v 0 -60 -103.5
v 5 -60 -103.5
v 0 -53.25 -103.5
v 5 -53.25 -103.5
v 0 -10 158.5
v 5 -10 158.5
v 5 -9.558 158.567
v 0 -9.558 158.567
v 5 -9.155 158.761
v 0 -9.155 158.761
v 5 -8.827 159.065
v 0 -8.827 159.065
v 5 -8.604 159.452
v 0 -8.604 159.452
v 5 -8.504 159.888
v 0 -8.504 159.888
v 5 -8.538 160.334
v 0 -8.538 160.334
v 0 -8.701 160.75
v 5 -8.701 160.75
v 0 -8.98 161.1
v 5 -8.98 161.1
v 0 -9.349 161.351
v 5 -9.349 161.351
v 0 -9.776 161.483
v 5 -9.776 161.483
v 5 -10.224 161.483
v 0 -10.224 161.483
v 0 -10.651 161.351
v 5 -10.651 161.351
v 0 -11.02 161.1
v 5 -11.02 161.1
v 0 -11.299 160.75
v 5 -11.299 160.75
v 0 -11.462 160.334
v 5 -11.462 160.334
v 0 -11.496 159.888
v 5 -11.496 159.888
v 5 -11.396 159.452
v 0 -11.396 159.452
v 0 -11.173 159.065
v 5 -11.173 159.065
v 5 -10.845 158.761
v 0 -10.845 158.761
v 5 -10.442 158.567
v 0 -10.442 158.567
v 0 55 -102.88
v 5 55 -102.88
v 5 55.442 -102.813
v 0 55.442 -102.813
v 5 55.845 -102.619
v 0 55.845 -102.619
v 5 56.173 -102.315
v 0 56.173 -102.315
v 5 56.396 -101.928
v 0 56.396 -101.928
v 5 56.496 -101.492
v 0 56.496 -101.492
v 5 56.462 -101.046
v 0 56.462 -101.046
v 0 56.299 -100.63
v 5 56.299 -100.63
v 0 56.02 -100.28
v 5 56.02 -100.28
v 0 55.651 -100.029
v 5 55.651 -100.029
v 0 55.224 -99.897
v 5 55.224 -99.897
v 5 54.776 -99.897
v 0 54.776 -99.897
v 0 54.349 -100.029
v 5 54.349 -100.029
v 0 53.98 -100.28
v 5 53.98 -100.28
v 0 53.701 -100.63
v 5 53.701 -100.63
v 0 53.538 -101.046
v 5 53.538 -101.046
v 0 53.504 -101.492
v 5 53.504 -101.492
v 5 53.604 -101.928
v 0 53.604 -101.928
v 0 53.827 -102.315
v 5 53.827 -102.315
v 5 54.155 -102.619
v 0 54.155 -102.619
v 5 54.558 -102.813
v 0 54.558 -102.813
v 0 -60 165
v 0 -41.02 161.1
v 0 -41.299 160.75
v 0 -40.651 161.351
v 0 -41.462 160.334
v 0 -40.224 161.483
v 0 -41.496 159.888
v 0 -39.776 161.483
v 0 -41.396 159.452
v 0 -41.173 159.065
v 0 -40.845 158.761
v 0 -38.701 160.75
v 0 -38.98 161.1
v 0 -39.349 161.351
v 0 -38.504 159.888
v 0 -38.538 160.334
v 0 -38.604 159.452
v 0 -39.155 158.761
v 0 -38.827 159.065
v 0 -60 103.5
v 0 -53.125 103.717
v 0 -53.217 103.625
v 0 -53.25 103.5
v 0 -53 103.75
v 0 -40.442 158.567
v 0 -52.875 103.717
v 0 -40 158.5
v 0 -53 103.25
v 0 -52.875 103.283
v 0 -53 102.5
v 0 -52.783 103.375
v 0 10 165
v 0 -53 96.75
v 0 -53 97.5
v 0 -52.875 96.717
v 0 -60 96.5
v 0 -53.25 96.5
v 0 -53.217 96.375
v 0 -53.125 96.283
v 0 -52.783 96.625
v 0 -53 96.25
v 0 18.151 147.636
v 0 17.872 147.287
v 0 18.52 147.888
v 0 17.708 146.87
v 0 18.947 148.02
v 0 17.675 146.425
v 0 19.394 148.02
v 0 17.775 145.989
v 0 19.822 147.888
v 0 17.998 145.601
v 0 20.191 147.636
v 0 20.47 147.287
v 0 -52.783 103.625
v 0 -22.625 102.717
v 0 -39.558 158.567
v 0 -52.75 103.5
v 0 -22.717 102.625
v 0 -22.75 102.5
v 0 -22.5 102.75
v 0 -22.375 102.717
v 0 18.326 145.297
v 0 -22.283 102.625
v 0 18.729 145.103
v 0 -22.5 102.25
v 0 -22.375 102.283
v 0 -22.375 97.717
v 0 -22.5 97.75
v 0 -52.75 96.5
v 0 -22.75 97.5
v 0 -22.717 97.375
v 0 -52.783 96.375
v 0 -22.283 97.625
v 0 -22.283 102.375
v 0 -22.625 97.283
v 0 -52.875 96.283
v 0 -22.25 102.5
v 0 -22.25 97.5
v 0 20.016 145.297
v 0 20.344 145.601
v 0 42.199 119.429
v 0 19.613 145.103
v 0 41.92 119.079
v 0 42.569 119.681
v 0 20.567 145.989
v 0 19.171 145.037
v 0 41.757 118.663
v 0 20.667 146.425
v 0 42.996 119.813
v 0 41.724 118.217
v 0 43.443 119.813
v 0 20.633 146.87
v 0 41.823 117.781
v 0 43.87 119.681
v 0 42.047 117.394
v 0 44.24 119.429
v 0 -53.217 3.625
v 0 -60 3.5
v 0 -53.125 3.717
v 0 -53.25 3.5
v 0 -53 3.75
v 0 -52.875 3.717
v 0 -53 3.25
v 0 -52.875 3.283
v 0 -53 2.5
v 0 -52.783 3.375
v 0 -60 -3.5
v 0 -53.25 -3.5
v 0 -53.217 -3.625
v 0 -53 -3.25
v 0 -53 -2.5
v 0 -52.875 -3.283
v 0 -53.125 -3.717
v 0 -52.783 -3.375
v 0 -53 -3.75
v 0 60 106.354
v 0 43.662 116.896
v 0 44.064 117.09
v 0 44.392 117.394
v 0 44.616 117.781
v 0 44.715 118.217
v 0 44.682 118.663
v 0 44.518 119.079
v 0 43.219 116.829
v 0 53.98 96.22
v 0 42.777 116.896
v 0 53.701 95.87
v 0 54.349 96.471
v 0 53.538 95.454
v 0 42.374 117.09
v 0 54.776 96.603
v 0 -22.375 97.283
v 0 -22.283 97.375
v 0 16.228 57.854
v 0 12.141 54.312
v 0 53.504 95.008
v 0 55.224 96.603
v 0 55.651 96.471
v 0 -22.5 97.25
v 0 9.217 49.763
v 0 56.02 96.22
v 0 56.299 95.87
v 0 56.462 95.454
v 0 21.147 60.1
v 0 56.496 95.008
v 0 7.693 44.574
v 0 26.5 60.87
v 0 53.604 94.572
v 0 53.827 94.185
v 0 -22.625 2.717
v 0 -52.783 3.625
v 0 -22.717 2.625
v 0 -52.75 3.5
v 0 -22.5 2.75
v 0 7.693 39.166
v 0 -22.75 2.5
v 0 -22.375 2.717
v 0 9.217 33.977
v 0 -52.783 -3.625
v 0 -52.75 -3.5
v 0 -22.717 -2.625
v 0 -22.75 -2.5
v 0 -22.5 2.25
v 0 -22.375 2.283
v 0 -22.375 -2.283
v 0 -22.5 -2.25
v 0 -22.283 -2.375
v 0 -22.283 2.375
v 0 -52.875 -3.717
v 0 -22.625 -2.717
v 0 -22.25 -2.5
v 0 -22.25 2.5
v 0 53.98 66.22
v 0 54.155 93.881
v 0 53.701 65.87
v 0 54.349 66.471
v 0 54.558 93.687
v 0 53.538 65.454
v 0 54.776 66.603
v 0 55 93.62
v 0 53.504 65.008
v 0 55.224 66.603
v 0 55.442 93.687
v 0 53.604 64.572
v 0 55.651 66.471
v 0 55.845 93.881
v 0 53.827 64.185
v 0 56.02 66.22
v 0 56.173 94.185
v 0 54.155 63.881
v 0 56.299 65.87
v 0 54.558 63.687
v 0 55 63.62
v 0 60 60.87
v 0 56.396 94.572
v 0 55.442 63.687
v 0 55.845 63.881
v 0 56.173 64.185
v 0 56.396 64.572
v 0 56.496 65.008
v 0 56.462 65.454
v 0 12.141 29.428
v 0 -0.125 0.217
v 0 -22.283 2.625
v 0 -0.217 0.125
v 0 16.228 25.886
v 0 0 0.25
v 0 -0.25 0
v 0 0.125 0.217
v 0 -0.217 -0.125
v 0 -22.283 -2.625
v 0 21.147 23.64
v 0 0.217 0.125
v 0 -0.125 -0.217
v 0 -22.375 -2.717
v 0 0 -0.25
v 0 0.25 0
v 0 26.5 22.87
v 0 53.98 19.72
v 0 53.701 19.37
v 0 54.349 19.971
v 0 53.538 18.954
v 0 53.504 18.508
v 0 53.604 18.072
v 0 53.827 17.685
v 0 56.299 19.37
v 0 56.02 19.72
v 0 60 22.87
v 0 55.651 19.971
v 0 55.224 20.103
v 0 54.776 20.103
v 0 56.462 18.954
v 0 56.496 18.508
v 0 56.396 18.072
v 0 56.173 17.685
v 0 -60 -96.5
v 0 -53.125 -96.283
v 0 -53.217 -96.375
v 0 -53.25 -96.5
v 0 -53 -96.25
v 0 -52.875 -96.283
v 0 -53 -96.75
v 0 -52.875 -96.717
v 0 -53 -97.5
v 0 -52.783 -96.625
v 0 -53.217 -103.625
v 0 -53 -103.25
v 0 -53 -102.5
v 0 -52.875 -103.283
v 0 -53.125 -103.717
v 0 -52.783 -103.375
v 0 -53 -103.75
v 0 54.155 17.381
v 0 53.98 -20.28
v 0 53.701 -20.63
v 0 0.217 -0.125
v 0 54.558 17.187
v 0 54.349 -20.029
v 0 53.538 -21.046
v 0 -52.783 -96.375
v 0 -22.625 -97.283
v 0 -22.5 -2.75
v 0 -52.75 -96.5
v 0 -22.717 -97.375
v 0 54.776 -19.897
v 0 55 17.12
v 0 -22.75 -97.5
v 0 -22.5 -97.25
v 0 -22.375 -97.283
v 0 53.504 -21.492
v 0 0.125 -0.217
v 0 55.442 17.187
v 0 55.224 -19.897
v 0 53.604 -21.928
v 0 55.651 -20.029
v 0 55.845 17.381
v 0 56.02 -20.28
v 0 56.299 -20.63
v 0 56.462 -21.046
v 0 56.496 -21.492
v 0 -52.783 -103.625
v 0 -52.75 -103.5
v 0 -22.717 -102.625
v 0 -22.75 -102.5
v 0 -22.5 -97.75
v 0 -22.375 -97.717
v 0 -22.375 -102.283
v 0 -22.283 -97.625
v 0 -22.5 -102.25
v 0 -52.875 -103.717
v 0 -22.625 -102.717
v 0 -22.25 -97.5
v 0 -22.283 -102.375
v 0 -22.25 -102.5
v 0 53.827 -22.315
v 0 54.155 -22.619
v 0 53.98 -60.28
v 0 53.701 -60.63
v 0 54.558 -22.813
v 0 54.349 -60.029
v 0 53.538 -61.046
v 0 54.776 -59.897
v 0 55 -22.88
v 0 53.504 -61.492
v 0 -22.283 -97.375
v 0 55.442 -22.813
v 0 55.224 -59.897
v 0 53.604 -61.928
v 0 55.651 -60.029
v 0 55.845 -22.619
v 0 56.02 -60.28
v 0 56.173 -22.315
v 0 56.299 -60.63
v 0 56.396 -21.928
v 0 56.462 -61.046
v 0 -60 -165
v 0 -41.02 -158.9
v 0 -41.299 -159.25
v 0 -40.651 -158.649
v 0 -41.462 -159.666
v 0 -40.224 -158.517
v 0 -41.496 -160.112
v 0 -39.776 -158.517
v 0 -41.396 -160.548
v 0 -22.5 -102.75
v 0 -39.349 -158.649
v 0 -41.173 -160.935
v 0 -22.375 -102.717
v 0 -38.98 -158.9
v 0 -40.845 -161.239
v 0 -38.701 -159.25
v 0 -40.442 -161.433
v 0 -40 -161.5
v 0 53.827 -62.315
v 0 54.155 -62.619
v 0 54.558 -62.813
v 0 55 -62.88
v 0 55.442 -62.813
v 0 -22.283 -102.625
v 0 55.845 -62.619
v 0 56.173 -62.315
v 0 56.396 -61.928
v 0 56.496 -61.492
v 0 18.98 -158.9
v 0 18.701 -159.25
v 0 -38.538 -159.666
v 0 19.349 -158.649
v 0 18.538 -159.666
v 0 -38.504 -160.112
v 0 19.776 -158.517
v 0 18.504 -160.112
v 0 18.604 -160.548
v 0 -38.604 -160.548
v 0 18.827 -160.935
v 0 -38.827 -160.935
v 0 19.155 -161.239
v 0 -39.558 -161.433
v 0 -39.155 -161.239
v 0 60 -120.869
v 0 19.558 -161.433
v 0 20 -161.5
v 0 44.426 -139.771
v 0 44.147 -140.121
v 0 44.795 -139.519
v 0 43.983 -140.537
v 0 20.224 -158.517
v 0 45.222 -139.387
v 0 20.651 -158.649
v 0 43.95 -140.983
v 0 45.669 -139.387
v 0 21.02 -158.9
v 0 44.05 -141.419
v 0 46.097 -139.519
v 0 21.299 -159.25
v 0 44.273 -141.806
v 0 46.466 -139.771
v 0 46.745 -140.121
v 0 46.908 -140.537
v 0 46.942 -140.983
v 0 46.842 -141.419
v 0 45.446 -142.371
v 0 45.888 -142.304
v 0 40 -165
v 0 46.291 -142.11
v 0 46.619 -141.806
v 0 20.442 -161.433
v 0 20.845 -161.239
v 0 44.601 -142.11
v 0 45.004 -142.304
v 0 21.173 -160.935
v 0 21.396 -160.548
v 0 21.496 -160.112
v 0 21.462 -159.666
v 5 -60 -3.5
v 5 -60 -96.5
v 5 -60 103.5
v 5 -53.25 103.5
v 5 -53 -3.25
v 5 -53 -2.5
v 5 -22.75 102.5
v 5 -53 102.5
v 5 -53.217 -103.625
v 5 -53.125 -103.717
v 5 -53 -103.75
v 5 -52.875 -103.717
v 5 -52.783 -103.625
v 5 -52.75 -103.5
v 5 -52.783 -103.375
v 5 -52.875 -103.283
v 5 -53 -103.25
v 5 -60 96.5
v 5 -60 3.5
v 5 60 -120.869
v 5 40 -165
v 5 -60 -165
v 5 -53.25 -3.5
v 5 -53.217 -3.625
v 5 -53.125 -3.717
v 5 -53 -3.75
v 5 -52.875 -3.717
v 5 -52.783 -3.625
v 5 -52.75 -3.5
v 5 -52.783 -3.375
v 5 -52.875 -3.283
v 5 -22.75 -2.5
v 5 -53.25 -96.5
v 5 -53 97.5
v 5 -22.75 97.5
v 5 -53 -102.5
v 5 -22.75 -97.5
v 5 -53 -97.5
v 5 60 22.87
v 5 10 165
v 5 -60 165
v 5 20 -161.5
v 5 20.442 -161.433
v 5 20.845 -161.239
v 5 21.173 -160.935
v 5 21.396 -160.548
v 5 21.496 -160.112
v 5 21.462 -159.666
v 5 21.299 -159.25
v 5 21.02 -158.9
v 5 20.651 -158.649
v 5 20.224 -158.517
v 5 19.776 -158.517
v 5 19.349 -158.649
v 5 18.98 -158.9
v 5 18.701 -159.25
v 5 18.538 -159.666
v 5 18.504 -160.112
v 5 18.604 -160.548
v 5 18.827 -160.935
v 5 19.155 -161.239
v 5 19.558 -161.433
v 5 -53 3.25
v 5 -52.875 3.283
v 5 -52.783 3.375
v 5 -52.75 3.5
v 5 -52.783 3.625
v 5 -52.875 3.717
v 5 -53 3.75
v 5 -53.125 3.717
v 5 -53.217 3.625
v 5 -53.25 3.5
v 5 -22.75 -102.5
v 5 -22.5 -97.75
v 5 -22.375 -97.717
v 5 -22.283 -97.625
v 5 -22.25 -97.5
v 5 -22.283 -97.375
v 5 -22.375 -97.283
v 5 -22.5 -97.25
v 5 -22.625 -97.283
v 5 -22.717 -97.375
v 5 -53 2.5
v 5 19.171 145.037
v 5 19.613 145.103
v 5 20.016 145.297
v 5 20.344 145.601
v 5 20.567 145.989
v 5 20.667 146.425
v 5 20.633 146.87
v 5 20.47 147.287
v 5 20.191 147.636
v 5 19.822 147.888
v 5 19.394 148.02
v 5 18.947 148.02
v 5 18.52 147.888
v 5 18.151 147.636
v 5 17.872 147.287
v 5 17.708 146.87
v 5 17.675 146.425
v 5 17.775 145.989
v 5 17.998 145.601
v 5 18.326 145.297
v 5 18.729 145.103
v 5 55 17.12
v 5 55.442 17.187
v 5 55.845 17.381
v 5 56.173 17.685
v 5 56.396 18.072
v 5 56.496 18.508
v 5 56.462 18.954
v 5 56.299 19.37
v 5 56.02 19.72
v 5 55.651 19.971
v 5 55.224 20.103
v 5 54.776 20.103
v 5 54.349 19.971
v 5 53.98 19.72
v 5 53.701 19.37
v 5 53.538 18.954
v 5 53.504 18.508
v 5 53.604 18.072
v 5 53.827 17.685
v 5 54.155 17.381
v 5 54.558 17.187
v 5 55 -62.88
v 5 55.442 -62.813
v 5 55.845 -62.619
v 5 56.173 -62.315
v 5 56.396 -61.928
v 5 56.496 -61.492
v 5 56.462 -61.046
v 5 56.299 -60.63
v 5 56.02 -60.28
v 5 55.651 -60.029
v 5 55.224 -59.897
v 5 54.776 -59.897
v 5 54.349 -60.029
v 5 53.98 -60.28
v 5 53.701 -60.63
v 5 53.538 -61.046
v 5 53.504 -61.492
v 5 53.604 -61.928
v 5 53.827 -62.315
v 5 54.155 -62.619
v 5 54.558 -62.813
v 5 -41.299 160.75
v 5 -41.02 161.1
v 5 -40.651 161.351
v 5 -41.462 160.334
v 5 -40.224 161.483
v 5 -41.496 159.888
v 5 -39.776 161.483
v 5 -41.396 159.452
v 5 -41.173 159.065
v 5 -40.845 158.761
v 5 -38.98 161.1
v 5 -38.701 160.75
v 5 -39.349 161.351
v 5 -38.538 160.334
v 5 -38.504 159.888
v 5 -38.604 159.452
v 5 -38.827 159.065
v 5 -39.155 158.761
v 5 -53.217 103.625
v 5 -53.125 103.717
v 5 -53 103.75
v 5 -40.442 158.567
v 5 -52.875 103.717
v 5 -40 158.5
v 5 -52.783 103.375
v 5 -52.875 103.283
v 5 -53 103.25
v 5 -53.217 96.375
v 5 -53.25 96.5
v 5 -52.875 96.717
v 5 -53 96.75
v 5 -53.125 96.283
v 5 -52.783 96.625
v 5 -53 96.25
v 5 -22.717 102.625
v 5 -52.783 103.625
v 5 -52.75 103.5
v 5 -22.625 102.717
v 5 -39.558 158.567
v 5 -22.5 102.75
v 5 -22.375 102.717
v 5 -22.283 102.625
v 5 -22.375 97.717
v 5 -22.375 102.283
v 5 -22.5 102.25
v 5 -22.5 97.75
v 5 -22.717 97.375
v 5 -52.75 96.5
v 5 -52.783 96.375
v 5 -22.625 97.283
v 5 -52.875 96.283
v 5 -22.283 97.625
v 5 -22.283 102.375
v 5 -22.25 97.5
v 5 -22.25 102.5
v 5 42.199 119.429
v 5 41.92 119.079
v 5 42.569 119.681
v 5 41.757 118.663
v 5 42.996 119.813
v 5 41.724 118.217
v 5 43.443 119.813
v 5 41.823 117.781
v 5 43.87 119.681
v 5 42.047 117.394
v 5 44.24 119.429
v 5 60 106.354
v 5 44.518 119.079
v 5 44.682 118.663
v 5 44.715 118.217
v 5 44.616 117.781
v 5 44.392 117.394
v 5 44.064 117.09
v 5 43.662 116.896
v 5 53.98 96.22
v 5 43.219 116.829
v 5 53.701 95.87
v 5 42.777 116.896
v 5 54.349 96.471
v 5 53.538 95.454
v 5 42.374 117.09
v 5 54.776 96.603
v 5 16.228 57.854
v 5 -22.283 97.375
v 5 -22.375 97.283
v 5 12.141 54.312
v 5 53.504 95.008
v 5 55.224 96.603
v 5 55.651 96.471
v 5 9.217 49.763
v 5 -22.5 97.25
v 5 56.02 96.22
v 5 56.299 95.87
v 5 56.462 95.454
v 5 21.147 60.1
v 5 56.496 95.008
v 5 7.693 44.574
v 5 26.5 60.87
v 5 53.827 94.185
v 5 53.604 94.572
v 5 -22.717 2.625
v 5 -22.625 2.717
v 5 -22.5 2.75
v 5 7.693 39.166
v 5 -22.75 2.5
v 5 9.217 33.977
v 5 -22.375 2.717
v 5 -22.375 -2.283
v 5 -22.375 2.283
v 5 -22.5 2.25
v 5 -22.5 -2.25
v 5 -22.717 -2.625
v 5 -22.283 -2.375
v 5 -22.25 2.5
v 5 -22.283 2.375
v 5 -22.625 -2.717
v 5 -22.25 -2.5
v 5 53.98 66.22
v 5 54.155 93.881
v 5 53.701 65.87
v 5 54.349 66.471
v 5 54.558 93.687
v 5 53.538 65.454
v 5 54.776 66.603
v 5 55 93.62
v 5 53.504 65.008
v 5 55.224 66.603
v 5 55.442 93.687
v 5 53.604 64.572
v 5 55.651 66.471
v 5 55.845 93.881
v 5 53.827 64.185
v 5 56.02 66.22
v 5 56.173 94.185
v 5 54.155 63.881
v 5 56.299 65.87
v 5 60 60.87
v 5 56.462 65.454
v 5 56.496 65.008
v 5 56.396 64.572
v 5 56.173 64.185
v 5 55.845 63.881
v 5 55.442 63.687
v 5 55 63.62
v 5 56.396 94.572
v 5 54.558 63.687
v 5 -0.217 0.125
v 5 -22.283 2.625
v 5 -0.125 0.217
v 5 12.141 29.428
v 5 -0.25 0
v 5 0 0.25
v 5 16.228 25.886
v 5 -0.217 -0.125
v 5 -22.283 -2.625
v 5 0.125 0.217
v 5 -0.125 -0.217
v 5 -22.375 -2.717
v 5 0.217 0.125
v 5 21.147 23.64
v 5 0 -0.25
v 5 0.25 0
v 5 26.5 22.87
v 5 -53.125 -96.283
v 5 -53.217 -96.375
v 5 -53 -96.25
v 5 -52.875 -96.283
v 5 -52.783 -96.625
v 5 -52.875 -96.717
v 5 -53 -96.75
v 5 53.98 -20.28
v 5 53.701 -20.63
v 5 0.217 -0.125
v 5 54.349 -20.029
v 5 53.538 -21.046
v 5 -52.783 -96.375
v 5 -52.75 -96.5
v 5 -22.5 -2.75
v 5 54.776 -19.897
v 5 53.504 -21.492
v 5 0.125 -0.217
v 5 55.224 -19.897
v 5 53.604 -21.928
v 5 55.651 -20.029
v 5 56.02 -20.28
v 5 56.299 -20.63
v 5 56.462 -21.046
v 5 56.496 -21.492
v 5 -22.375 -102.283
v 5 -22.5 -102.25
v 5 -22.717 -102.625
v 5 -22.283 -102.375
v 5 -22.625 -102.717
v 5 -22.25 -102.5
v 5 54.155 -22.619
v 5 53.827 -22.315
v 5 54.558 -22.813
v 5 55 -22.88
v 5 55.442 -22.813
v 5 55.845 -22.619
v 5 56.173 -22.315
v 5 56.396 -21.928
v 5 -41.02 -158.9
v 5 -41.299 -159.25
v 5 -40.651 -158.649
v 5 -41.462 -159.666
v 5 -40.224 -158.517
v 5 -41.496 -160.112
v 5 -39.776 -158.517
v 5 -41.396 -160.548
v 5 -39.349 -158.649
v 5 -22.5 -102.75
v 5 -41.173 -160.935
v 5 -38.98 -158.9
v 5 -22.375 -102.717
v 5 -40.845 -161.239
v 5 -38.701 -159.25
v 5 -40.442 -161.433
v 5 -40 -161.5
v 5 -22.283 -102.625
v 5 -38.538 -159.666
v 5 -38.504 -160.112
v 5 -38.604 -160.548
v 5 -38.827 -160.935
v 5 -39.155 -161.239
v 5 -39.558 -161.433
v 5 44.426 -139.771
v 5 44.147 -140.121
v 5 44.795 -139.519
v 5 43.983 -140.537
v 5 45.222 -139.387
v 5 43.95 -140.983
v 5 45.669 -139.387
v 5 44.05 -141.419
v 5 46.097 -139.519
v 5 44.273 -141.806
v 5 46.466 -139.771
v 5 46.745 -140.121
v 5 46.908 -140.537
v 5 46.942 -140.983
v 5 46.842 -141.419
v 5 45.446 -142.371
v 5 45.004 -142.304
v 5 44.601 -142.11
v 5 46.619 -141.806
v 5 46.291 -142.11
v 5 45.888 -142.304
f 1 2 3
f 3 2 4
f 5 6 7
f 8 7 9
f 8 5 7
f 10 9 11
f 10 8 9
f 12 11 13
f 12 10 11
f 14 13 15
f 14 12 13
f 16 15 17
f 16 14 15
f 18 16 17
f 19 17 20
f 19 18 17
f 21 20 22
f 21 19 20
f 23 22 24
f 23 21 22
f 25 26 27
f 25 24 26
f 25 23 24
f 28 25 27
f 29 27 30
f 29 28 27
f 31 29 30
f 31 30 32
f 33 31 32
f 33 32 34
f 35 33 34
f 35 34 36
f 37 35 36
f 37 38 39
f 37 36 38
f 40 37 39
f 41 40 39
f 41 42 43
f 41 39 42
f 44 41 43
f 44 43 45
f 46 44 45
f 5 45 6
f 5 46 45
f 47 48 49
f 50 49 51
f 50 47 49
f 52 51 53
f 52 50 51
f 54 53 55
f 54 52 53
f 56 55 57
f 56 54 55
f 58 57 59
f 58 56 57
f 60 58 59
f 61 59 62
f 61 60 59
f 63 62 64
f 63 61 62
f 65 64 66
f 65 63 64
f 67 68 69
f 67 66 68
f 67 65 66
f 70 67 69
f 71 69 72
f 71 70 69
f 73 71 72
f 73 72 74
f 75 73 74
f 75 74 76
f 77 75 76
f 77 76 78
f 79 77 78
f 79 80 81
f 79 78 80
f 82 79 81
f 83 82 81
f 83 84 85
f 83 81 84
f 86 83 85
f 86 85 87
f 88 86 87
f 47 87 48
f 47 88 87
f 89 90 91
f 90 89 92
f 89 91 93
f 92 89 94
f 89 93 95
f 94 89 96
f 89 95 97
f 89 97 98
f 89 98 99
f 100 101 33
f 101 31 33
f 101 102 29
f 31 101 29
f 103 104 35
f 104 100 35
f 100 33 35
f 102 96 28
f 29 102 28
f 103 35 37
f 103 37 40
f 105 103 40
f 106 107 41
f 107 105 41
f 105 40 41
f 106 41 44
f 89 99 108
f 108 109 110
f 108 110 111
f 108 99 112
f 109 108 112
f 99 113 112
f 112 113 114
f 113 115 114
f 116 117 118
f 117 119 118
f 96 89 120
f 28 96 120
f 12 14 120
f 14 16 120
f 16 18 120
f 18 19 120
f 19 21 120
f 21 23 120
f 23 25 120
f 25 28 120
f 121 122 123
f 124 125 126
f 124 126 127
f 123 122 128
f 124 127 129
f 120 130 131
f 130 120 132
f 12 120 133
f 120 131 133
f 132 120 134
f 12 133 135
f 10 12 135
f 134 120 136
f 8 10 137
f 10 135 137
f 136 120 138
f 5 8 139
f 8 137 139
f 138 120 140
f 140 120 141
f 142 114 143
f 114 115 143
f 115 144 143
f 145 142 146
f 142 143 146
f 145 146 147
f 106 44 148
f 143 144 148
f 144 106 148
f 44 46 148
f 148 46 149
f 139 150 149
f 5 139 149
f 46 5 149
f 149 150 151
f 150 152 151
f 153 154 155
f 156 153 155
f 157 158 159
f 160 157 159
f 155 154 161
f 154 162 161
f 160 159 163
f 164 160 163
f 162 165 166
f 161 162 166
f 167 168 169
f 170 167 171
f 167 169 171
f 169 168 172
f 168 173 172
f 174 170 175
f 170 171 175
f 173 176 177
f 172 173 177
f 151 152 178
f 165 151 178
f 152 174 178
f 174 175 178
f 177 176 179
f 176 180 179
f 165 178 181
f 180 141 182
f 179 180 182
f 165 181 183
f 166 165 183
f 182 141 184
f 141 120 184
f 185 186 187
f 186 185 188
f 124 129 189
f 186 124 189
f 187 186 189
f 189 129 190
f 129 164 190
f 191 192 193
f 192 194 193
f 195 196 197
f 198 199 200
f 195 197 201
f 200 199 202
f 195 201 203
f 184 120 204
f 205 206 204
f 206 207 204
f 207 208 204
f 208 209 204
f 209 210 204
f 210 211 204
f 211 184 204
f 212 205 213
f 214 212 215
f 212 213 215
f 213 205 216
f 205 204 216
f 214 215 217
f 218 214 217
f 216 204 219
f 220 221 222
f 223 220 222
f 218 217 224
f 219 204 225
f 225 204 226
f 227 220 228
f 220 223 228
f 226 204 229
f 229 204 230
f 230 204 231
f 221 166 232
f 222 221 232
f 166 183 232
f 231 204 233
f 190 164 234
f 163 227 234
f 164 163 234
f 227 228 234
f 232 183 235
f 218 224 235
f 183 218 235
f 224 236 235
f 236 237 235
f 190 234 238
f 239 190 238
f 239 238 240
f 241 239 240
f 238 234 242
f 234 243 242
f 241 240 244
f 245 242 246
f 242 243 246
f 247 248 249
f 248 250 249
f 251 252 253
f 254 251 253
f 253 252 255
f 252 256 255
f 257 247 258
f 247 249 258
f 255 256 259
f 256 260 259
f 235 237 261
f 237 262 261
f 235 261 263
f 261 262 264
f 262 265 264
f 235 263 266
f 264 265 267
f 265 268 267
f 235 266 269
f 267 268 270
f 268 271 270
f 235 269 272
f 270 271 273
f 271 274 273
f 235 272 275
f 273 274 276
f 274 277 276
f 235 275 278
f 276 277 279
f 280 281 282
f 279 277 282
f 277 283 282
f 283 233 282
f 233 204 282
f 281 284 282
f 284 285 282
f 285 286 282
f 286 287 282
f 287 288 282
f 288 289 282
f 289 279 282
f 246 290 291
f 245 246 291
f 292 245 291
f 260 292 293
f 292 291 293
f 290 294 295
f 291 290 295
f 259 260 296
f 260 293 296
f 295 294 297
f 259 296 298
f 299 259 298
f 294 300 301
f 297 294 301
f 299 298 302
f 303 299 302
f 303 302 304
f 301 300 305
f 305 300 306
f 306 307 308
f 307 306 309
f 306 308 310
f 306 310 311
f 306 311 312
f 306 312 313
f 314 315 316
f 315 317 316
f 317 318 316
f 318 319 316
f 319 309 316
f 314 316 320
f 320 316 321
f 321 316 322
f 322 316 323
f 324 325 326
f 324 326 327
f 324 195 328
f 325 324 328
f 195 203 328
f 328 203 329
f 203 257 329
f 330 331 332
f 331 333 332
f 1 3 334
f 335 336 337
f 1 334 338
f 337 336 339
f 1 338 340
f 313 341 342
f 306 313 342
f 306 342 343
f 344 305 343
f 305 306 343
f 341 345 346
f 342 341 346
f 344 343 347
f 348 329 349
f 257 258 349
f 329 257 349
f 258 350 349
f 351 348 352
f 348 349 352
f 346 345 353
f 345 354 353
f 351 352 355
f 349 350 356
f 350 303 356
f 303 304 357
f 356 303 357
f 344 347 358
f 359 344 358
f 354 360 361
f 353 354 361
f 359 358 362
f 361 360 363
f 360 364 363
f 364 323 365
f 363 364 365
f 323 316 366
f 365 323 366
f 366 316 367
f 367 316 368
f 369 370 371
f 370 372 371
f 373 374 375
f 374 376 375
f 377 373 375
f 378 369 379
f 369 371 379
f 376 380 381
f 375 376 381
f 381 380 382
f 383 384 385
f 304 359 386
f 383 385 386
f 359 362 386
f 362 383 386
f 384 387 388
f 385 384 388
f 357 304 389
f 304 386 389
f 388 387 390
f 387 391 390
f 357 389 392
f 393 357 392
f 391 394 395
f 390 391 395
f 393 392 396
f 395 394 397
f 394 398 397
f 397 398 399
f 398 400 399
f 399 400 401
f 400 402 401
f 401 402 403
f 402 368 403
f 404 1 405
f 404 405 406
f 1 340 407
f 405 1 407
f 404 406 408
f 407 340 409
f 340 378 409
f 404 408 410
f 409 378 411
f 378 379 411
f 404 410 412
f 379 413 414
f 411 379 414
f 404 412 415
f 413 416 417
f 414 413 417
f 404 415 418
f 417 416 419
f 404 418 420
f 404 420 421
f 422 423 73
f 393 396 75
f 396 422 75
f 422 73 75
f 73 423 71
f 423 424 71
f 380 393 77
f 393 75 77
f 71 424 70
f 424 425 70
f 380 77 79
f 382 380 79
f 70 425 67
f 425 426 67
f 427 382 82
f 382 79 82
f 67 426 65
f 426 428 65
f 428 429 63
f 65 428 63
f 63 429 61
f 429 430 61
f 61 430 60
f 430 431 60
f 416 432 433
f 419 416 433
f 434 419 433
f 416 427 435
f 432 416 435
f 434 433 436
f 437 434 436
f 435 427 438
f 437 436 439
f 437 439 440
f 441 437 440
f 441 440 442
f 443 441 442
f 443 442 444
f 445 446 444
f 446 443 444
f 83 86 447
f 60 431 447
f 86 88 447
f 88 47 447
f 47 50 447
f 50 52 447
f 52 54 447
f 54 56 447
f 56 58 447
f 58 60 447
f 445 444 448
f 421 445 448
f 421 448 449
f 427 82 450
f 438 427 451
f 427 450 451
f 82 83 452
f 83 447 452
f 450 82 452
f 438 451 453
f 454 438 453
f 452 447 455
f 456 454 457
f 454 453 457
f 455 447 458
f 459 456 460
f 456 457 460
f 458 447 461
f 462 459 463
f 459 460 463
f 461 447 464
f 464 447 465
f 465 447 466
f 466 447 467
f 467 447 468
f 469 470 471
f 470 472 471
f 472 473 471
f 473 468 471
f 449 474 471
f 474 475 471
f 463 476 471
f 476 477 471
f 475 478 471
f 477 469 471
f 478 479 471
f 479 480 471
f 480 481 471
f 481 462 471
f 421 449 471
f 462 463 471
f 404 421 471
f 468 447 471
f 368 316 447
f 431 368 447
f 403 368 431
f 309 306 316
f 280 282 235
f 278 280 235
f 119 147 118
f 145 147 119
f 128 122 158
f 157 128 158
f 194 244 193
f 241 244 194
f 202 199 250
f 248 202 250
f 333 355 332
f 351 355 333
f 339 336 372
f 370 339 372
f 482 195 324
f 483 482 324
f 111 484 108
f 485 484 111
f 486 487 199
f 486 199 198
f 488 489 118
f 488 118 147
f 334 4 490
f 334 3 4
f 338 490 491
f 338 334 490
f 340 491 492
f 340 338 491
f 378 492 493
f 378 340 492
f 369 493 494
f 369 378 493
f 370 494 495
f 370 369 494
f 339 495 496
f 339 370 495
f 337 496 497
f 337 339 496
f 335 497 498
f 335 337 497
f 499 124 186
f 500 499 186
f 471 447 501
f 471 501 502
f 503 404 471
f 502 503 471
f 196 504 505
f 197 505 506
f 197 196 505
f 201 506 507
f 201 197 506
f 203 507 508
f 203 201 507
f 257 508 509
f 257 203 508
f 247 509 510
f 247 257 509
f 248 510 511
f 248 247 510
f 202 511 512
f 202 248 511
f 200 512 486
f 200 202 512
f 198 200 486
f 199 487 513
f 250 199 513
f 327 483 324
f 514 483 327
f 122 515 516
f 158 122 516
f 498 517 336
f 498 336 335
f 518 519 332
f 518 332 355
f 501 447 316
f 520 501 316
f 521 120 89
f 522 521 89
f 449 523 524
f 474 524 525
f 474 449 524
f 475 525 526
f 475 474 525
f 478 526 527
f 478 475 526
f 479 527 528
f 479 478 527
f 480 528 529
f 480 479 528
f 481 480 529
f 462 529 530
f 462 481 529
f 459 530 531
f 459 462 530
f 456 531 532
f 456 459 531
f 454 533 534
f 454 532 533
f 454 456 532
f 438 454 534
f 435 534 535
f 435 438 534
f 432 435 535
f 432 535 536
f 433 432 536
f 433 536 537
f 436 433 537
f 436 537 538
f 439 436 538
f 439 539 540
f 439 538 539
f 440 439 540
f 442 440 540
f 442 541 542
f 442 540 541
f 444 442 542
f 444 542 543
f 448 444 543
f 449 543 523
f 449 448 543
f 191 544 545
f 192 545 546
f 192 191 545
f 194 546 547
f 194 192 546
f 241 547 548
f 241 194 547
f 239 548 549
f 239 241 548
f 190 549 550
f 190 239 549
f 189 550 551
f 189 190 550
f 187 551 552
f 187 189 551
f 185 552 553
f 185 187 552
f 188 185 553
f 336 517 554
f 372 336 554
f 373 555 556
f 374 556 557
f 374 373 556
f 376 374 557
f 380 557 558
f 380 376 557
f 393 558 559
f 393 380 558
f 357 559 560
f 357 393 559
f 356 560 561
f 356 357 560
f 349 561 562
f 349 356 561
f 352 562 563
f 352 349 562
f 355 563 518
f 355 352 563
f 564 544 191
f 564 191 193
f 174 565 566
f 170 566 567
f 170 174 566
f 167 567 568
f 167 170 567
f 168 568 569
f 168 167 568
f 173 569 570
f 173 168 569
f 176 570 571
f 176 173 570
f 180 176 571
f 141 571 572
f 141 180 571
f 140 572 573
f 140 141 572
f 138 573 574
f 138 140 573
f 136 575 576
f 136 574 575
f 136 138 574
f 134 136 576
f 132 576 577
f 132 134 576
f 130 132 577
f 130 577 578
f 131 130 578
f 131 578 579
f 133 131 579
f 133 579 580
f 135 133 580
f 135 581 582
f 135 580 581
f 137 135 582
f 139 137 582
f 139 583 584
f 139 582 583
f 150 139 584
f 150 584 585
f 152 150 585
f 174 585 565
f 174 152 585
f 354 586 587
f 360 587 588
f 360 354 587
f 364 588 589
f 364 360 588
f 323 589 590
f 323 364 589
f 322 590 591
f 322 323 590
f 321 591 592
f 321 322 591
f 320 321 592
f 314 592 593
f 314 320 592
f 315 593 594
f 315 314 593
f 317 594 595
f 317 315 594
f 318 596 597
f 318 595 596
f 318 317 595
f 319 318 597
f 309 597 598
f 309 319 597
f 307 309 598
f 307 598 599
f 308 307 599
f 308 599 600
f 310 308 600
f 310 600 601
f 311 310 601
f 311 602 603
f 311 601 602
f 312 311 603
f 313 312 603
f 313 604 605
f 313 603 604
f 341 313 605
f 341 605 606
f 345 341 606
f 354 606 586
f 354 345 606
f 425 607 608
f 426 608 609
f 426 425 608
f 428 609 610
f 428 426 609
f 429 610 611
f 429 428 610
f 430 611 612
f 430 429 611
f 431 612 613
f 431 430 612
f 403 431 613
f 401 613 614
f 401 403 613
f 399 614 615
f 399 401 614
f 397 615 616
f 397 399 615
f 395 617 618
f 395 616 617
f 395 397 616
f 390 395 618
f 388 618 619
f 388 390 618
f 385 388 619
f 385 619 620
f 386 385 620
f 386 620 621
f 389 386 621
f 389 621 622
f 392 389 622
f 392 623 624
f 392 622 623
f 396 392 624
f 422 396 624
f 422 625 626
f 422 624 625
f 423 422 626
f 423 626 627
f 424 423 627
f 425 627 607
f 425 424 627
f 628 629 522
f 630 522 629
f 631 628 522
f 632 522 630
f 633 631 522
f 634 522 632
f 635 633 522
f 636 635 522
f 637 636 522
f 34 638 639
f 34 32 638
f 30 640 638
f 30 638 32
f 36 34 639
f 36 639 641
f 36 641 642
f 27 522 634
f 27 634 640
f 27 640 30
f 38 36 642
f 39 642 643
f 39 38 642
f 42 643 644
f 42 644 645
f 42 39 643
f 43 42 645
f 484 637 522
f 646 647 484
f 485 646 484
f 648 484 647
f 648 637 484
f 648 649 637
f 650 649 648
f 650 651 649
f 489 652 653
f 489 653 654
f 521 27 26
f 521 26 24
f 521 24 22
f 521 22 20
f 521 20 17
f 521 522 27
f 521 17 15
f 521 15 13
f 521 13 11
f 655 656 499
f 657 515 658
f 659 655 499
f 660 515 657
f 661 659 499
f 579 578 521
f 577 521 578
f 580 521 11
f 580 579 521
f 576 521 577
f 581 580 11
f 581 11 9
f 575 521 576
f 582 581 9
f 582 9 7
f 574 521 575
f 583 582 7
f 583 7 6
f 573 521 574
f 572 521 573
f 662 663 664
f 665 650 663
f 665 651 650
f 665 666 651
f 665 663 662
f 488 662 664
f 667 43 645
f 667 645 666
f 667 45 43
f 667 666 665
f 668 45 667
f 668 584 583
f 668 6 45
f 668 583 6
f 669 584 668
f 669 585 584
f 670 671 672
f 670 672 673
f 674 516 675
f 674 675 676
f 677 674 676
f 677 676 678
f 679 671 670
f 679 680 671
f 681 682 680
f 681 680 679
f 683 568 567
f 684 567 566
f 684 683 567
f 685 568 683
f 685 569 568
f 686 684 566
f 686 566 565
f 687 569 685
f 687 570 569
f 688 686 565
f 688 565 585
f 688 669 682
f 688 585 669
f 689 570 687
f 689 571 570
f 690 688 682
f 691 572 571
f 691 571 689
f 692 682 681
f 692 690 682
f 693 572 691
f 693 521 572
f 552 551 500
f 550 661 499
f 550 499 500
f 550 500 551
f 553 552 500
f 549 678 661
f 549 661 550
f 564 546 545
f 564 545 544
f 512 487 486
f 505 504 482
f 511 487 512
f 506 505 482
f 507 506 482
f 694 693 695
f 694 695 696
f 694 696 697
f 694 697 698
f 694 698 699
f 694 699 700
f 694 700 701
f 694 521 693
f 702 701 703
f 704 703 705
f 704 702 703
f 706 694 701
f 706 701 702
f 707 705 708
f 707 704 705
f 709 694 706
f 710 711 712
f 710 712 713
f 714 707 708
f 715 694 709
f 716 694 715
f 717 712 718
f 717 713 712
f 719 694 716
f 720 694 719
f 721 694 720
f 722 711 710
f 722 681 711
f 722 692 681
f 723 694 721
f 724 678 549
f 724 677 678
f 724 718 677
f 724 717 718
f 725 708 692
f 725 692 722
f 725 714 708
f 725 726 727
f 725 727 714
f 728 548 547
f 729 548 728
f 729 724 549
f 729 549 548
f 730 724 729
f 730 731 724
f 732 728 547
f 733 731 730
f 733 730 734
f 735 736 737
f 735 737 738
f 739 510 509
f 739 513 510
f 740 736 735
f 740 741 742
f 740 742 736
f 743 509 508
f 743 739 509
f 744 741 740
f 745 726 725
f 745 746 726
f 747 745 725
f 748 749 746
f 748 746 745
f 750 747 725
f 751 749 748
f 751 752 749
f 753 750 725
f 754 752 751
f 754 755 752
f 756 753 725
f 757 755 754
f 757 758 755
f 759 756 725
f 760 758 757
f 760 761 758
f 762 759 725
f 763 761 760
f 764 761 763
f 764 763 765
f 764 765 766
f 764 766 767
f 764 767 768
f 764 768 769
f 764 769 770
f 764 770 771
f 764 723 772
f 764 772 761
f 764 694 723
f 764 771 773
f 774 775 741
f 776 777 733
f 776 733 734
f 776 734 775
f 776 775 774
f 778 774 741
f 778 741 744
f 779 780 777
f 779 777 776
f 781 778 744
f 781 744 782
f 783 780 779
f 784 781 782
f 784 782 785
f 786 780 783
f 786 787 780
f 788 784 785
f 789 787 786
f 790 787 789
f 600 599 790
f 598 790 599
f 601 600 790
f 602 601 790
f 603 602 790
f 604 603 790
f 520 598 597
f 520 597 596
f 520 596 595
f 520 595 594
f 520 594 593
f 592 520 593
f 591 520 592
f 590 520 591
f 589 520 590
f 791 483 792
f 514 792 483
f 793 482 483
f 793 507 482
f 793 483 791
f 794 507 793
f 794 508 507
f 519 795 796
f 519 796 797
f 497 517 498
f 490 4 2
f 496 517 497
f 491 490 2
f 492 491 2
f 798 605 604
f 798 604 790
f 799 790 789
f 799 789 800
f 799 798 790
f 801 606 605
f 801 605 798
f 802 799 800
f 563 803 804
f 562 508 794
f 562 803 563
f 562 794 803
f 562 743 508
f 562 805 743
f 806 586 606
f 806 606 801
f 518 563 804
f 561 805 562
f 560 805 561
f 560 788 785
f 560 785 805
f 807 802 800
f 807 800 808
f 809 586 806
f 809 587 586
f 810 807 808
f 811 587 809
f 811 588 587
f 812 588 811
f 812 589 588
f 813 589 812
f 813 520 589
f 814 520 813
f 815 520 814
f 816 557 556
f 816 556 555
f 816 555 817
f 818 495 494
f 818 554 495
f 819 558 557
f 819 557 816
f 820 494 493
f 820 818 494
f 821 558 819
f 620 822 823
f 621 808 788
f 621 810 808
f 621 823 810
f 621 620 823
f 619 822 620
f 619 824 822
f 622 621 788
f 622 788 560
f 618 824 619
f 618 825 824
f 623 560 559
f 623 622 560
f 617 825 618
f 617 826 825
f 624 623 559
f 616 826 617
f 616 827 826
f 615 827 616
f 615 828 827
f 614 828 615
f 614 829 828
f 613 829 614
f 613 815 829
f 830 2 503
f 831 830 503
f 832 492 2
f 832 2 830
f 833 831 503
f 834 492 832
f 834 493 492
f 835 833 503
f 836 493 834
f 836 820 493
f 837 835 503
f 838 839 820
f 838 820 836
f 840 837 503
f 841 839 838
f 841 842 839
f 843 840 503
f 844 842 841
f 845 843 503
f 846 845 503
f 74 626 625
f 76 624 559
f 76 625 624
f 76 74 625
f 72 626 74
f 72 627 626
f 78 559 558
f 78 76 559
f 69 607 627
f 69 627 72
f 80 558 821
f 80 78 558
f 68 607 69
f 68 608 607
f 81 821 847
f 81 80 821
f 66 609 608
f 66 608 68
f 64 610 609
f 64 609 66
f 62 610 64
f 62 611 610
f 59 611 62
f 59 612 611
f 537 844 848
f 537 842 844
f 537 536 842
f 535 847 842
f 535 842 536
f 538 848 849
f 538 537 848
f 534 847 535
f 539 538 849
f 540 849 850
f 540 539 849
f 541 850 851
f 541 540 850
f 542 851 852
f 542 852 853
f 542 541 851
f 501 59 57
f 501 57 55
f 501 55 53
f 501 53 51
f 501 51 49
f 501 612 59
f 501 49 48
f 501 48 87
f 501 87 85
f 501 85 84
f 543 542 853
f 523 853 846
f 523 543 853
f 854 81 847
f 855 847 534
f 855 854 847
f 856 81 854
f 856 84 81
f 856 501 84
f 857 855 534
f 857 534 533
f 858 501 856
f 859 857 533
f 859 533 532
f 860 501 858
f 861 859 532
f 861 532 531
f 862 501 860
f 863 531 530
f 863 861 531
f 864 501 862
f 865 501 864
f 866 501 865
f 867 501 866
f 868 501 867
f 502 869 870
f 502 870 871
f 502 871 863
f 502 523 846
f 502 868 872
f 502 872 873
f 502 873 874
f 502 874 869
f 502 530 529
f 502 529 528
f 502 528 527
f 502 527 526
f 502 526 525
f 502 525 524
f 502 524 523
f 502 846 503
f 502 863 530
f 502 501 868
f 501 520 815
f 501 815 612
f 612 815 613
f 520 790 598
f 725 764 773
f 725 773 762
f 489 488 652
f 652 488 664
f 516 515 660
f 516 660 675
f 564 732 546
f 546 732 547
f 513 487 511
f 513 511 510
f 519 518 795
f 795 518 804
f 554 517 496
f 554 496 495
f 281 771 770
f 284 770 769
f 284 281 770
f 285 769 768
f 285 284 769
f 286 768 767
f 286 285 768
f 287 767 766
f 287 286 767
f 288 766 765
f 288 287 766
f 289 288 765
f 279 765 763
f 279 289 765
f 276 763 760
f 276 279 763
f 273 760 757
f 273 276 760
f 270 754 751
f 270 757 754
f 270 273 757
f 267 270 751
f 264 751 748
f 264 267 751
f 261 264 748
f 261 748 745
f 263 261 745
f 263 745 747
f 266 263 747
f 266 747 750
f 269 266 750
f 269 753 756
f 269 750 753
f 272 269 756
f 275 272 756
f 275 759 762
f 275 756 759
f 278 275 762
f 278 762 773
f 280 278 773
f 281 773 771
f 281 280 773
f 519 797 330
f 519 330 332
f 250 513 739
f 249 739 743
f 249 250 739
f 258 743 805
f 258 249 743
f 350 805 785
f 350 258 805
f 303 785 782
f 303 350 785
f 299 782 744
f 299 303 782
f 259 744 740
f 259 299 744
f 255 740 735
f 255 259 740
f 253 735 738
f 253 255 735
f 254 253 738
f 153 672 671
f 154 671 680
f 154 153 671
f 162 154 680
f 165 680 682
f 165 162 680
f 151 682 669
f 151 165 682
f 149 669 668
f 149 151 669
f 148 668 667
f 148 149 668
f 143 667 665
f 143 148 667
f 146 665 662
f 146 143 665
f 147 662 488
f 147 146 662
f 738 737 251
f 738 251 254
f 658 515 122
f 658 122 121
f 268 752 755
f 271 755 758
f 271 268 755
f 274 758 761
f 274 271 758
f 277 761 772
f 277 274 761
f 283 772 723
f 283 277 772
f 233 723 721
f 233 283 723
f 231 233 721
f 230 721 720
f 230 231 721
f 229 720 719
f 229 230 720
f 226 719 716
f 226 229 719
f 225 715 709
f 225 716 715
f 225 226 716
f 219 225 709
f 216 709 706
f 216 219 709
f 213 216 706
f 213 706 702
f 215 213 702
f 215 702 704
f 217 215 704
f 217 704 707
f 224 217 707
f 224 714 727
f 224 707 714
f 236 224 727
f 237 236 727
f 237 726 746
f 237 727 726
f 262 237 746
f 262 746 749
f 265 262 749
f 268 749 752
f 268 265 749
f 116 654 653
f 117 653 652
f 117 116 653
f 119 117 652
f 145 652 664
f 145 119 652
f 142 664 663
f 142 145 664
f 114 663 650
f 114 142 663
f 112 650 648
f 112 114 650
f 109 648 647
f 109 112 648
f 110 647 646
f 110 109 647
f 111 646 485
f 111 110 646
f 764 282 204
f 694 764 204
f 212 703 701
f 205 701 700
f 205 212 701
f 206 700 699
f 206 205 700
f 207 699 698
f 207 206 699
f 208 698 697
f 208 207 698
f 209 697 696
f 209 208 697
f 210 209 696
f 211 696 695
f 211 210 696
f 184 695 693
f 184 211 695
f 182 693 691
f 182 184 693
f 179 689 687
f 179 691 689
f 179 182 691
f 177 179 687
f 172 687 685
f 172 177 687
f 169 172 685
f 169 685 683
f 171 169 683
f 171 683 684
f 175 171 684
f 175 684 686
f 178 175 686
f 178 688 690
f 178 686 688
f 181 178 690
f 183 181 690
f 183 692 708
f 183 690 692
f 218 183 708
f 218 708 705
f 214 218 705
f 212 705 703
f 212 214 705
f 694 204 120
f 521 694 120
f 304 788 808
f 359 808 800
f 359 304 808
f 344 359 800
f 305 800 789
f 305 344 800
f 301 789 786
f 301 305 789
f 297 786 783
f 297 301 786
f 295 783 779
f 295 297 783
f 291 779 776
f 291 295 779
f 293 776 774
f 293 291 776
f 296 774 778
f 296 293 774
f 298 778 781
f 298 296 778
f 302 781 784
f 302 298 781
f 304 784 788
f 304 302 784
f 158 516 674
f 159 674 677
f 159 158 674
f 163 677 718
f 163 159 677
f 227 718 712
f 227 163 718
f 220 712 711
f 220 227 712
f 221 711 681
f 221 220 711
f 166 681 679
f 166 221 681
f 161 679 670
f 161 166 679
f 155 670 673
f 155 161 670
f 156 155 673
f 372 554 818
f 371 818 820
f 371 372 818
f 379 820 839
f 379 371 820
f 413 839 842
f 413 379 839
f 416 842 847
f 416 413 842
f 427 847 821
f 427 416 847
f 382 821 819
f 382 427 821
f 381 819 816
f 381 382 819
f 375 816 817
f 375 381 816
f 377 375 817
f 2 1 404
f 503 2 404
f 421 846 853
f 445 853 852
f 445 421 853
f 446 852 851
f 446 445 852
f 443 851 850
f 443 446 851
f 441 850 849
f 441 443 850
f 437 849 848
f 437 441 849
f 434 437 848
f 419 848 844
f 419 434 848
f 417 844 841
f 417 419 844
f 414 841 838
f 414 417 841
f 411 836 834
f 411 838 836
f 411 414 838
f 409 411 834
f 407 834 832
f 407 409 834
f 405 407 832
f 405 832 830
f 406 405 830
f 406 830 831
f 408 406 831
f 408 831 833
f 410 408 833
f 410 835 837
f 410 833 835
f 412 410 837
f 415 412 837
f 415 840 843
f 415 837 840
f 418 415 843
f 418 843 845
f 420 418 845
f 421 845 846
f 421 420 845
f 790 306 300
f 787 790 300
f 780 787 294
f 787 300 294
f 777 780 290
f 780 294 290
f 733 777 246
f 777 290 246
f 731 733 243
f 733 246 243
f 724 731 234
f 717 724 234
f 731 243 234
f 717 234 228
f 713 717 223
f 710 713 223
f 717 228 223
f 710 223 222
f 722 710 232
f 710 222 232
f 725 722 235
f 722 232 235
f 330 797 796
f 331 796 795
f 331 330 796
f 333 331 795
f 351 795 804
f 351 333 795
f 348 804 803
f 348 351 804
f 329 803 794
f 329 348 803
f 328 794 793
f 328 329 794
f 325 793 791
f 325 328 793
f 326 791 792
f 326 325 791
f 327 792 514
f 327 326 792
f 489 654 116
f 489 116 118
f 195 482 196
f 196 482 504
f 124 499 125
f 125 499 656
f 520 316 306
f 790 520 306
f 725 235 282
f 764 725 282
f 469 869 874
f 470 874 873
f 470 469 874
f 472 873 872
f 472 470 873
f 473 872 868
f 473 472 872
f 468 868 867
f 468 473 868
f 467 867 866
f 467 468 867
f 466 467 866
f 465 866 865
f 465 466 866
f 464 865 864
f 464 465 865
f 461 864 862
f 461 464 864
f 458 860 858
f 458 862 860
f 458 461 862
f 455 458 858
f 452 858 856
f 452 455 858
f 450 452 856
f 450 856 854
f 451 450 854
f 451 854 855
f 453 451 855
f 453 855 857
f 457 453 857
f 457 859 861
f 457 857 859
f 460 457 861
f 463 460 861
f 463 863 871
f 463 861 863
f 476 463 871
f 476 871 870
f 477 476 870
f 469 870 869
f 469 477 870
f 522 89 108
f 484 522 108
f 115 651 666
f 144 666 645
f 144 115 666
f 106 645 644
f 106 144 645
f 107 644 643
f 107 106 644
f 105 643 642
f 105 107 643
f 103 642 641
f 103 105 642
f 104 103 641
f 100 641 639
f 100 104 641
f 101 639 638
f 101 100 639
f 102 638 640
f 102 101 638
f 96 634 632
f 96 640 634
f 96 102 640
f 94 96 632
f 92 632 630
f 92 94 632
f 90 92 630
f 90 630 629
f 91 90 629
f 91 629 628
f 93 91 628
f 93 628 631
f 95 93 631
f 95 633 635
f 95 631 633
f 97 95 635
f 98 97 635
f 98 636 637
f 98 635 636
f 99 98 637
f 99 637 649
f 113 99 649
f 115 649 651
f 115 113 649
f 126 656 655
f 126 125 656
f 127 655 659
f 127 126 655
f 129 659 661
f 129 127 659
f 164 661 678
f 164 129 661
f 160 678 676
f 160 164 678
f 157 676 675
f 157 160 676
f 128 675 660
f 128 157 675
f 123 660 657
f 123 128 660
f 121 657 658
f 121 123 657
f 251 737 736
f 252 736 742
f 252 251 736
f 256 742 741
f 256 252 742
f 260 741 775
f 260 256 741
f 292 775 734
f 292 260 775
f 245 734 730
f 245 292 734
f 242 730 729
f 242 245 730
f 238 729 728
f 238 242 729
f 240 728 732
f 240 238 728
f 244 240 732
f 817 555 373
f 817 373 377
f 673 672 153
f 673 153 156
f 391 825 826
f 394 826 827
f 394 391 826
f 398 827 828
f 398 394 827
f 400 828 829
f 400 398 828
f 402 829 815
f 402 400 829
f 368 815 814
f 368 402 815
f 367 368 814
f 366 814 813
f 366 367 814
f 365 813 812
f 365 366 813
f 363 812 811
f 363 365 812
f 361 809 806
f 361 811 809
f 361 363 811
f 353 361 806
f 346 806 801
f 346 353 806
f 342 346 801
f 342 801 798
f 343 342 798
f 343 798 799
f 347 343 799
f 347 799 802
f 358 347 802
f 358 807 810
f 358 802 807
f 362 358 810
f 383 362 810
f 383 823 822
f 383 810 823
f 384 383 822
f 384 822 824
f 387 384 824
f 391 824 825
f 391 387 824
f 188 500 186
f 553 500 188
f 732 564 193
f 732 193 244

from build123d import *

# Parameters (mm, degrees)
ESTRUSIONE_ESTRUSIONE1_DEPTH = 5
TAGLIO_ESTRUSIONE5_DEPTH     = 6
SCHIZZO2_W                   = 5
SCHIZZO2_H                   = 37.5
TAGLIO_ESTRUSIONE1_DEPTH     = 6
SCHIZZO3_R                   = 1.5
TAGLIO_ESTRUSIONE2_DEPTH     = 6
SCHIZZO8_W                   = 7
SCHIZZO8_H                   = 7
TAGLIO_ESTRUSIONE6_DEPTH     = 6
SCHIZZO10_R                  = 0.25
TAGLIO_ESTRUSIONE11_DEPTH    = 6


with BuildPart() as part:
    # Schizzo1 → Estrusione-Estrusione1 (new body)
    with BuildSketch(Plane(origin=(0, 0, 0), x_dir=(0, 0, -1), z_dir=(1, 0, 0))):
        Polygon((165, 60), (-106.353966324, 60), (-165, 10), (-165, -60), (165, -60), align=None)
    extrude(amount=ESTRUSIONE_ESTRUSIONE1_DEPTH)

    # Schizzo7 → Taglio-Estrusione5 (cut, through all)
    with BuildSketch(Plane(origin=(0, 0, 0), x_dir=(0, 0, -1), z_dir=(1, 0, 0))):
        Polygon((165, 40), (165, 60), (120.869304328, 60), align=None)
    extrude(amount=TAGLIO_ESTRUSIONE5_DEPTH, mode=Mode.SUBTRACT)

    # Schizzo2 → Taglio-Estrusione1 (cut, through all)
    with BuildSketch(Plane(origin=(5, 0, 0), x_dir=(0, 0, -1), z_dir=(1, 0, 0))):
        with Locations((100, -41.25)):
            Rectangle(SCHIZZO2_W, SCHIZZO2_H)
        with Locations((0, -41.25)):
            Rectangle(SCHIZZO2_W, SCHIZZO2_H)
        with Locations((-100, -41.25)):
            Rectangle(SCHIZZO2_W, SCHIZZO2_H)
    extrude(amount=-TAGLIO_ESTRUSIONE1_DEPTH, mode=Mode.SUBTRACT)

    # Schizzo3 → Taglio-Estrusione2 (cut, through all)
    with BuildSketch(Plane(origin=(0, 0, 0), x_dir=(0, 0, -1), z_dir=(1, 0, 0))):
        with Locations((-65.12, 55)):
            Circle(SCHIZZO3_R)
        with Locations((-18.62, 55)):
            Circle(SCHIZZO3_R)
        with Locations((-95.12, 55)):
            Circle(SCHIZZO3_R)
        with Locations((21.38, 55)):
            Circle(SCHIZZO3_R)
        with Locations((61.38, 55)):
            Circle(SCHIZZO3_R)
        with Locations((101.38, 55)):
            Circle(SCHIZZO3_R)
        with Locations((-118.329493742, 43.219453434)):
            Circle(SCHIZZO3_R)
        with Locations((-146.536630365, 19.170822303)):
            Circle(SCHIZZO3_R)
        with Locations((-160, -10)):
            Circle(SCHIZZO3_R)
        with Locations((-160, -40)):
            Circle(SCHIZZO3_R)
        with Locations((160, -40)):
            Circle(SCHIZZO3_R)
        with Locations((160, 20)):
            Circle(SCHIZZO3_R)
        with Locations((140.870719583, 45.44586097)):
            Circle(SCHIZZO3_R)
        with BuildLine():
            Line((-60.87, 26.5), (-60.87, 60))
            ThreePointArc((-60.87, 60), (-41.87, 79), (-22.87, 60))
            Line((-22.87, 60), (-22.87, 26.5))
            ThreePointArc((-22.87, 26.5), (-41.87, 7.5), (-60.87, 26.5))
        make_face()
    extrude(amount=TAGLIO_ESTRUSIONE2_DEPTH, mode=Mode.SUBTRACT)

    # Schizzo8 → Taglio-Estrusione6 (cut, through all)
    with BuildSketch(Plane(origin=(5, 0, 0), x_dir=(0, 0, -1), z_dir=(1, 0, 0))):
        with Locations((0, -56.5)):
            Rectangle(SCHIZZO8_W, SCHIZZO8_H)
        with Locations((100, -56.5)):
            Rectangle(SCHIZZO8_W, SCHIZZO8_H)
        with Locations((-100, -56.5)):
            Rectangle(SCHIZZO8_W, SCHIZZO8_H)
    extrude(amount=-TAGLIO_ESTRUSIONE6_DEPTH, mode=Mode.SUBTRACT)

    # Schizzo10 → Taglio-Estrusione11 (cut, through all)
    with BuildSketch(Plane(origin=(0, 0, 0), x_dir=(0, 0, -1), z_dir=(1, 0, 0))):
        with Locations((-102.5, -22.5)):
            Circle(SCHIZZO10_R)
        with Locations((-97.5, -22.5)):
            Circle(SCHIZZO10_R)
        with Locations((-103.5, -53)):
            Circle(SCHIZZO10_R)
        with Locations((-96.5, -53)):
            Circle(SCHIZZO10_R)
        with Locations((-2.5, -22.5)):
            Circle(SCHIZZO10_R)
        Circle(SCHIZZO10_R)
        with Locations((2.5, -22.5)):
            Circle(SCHIZZO10_R)
        with Locations((-3.5, -53)):
            Circle(SCHIZZO10_R)
        with Locations((3.5, -53)):
            Circle(SCHIZZO10_R)
        with Locations((97.5, -22.5)):
            Circle(SCHIZZO10_R)
        with Locations((102.5, -22.5)):
            Circle(SCHIZZO10_R)
        with Locations((96.5, -53)):
            Circle(SCHIZZO10_R)
        with Locations((103.5, -53)):
            Circle(SCHIZZO10_R)
    extrude(amount=TAGLIO_ESTRUSIONE11_DEPTH, mode=Mode.SUBTRACT)


solid = part.part
